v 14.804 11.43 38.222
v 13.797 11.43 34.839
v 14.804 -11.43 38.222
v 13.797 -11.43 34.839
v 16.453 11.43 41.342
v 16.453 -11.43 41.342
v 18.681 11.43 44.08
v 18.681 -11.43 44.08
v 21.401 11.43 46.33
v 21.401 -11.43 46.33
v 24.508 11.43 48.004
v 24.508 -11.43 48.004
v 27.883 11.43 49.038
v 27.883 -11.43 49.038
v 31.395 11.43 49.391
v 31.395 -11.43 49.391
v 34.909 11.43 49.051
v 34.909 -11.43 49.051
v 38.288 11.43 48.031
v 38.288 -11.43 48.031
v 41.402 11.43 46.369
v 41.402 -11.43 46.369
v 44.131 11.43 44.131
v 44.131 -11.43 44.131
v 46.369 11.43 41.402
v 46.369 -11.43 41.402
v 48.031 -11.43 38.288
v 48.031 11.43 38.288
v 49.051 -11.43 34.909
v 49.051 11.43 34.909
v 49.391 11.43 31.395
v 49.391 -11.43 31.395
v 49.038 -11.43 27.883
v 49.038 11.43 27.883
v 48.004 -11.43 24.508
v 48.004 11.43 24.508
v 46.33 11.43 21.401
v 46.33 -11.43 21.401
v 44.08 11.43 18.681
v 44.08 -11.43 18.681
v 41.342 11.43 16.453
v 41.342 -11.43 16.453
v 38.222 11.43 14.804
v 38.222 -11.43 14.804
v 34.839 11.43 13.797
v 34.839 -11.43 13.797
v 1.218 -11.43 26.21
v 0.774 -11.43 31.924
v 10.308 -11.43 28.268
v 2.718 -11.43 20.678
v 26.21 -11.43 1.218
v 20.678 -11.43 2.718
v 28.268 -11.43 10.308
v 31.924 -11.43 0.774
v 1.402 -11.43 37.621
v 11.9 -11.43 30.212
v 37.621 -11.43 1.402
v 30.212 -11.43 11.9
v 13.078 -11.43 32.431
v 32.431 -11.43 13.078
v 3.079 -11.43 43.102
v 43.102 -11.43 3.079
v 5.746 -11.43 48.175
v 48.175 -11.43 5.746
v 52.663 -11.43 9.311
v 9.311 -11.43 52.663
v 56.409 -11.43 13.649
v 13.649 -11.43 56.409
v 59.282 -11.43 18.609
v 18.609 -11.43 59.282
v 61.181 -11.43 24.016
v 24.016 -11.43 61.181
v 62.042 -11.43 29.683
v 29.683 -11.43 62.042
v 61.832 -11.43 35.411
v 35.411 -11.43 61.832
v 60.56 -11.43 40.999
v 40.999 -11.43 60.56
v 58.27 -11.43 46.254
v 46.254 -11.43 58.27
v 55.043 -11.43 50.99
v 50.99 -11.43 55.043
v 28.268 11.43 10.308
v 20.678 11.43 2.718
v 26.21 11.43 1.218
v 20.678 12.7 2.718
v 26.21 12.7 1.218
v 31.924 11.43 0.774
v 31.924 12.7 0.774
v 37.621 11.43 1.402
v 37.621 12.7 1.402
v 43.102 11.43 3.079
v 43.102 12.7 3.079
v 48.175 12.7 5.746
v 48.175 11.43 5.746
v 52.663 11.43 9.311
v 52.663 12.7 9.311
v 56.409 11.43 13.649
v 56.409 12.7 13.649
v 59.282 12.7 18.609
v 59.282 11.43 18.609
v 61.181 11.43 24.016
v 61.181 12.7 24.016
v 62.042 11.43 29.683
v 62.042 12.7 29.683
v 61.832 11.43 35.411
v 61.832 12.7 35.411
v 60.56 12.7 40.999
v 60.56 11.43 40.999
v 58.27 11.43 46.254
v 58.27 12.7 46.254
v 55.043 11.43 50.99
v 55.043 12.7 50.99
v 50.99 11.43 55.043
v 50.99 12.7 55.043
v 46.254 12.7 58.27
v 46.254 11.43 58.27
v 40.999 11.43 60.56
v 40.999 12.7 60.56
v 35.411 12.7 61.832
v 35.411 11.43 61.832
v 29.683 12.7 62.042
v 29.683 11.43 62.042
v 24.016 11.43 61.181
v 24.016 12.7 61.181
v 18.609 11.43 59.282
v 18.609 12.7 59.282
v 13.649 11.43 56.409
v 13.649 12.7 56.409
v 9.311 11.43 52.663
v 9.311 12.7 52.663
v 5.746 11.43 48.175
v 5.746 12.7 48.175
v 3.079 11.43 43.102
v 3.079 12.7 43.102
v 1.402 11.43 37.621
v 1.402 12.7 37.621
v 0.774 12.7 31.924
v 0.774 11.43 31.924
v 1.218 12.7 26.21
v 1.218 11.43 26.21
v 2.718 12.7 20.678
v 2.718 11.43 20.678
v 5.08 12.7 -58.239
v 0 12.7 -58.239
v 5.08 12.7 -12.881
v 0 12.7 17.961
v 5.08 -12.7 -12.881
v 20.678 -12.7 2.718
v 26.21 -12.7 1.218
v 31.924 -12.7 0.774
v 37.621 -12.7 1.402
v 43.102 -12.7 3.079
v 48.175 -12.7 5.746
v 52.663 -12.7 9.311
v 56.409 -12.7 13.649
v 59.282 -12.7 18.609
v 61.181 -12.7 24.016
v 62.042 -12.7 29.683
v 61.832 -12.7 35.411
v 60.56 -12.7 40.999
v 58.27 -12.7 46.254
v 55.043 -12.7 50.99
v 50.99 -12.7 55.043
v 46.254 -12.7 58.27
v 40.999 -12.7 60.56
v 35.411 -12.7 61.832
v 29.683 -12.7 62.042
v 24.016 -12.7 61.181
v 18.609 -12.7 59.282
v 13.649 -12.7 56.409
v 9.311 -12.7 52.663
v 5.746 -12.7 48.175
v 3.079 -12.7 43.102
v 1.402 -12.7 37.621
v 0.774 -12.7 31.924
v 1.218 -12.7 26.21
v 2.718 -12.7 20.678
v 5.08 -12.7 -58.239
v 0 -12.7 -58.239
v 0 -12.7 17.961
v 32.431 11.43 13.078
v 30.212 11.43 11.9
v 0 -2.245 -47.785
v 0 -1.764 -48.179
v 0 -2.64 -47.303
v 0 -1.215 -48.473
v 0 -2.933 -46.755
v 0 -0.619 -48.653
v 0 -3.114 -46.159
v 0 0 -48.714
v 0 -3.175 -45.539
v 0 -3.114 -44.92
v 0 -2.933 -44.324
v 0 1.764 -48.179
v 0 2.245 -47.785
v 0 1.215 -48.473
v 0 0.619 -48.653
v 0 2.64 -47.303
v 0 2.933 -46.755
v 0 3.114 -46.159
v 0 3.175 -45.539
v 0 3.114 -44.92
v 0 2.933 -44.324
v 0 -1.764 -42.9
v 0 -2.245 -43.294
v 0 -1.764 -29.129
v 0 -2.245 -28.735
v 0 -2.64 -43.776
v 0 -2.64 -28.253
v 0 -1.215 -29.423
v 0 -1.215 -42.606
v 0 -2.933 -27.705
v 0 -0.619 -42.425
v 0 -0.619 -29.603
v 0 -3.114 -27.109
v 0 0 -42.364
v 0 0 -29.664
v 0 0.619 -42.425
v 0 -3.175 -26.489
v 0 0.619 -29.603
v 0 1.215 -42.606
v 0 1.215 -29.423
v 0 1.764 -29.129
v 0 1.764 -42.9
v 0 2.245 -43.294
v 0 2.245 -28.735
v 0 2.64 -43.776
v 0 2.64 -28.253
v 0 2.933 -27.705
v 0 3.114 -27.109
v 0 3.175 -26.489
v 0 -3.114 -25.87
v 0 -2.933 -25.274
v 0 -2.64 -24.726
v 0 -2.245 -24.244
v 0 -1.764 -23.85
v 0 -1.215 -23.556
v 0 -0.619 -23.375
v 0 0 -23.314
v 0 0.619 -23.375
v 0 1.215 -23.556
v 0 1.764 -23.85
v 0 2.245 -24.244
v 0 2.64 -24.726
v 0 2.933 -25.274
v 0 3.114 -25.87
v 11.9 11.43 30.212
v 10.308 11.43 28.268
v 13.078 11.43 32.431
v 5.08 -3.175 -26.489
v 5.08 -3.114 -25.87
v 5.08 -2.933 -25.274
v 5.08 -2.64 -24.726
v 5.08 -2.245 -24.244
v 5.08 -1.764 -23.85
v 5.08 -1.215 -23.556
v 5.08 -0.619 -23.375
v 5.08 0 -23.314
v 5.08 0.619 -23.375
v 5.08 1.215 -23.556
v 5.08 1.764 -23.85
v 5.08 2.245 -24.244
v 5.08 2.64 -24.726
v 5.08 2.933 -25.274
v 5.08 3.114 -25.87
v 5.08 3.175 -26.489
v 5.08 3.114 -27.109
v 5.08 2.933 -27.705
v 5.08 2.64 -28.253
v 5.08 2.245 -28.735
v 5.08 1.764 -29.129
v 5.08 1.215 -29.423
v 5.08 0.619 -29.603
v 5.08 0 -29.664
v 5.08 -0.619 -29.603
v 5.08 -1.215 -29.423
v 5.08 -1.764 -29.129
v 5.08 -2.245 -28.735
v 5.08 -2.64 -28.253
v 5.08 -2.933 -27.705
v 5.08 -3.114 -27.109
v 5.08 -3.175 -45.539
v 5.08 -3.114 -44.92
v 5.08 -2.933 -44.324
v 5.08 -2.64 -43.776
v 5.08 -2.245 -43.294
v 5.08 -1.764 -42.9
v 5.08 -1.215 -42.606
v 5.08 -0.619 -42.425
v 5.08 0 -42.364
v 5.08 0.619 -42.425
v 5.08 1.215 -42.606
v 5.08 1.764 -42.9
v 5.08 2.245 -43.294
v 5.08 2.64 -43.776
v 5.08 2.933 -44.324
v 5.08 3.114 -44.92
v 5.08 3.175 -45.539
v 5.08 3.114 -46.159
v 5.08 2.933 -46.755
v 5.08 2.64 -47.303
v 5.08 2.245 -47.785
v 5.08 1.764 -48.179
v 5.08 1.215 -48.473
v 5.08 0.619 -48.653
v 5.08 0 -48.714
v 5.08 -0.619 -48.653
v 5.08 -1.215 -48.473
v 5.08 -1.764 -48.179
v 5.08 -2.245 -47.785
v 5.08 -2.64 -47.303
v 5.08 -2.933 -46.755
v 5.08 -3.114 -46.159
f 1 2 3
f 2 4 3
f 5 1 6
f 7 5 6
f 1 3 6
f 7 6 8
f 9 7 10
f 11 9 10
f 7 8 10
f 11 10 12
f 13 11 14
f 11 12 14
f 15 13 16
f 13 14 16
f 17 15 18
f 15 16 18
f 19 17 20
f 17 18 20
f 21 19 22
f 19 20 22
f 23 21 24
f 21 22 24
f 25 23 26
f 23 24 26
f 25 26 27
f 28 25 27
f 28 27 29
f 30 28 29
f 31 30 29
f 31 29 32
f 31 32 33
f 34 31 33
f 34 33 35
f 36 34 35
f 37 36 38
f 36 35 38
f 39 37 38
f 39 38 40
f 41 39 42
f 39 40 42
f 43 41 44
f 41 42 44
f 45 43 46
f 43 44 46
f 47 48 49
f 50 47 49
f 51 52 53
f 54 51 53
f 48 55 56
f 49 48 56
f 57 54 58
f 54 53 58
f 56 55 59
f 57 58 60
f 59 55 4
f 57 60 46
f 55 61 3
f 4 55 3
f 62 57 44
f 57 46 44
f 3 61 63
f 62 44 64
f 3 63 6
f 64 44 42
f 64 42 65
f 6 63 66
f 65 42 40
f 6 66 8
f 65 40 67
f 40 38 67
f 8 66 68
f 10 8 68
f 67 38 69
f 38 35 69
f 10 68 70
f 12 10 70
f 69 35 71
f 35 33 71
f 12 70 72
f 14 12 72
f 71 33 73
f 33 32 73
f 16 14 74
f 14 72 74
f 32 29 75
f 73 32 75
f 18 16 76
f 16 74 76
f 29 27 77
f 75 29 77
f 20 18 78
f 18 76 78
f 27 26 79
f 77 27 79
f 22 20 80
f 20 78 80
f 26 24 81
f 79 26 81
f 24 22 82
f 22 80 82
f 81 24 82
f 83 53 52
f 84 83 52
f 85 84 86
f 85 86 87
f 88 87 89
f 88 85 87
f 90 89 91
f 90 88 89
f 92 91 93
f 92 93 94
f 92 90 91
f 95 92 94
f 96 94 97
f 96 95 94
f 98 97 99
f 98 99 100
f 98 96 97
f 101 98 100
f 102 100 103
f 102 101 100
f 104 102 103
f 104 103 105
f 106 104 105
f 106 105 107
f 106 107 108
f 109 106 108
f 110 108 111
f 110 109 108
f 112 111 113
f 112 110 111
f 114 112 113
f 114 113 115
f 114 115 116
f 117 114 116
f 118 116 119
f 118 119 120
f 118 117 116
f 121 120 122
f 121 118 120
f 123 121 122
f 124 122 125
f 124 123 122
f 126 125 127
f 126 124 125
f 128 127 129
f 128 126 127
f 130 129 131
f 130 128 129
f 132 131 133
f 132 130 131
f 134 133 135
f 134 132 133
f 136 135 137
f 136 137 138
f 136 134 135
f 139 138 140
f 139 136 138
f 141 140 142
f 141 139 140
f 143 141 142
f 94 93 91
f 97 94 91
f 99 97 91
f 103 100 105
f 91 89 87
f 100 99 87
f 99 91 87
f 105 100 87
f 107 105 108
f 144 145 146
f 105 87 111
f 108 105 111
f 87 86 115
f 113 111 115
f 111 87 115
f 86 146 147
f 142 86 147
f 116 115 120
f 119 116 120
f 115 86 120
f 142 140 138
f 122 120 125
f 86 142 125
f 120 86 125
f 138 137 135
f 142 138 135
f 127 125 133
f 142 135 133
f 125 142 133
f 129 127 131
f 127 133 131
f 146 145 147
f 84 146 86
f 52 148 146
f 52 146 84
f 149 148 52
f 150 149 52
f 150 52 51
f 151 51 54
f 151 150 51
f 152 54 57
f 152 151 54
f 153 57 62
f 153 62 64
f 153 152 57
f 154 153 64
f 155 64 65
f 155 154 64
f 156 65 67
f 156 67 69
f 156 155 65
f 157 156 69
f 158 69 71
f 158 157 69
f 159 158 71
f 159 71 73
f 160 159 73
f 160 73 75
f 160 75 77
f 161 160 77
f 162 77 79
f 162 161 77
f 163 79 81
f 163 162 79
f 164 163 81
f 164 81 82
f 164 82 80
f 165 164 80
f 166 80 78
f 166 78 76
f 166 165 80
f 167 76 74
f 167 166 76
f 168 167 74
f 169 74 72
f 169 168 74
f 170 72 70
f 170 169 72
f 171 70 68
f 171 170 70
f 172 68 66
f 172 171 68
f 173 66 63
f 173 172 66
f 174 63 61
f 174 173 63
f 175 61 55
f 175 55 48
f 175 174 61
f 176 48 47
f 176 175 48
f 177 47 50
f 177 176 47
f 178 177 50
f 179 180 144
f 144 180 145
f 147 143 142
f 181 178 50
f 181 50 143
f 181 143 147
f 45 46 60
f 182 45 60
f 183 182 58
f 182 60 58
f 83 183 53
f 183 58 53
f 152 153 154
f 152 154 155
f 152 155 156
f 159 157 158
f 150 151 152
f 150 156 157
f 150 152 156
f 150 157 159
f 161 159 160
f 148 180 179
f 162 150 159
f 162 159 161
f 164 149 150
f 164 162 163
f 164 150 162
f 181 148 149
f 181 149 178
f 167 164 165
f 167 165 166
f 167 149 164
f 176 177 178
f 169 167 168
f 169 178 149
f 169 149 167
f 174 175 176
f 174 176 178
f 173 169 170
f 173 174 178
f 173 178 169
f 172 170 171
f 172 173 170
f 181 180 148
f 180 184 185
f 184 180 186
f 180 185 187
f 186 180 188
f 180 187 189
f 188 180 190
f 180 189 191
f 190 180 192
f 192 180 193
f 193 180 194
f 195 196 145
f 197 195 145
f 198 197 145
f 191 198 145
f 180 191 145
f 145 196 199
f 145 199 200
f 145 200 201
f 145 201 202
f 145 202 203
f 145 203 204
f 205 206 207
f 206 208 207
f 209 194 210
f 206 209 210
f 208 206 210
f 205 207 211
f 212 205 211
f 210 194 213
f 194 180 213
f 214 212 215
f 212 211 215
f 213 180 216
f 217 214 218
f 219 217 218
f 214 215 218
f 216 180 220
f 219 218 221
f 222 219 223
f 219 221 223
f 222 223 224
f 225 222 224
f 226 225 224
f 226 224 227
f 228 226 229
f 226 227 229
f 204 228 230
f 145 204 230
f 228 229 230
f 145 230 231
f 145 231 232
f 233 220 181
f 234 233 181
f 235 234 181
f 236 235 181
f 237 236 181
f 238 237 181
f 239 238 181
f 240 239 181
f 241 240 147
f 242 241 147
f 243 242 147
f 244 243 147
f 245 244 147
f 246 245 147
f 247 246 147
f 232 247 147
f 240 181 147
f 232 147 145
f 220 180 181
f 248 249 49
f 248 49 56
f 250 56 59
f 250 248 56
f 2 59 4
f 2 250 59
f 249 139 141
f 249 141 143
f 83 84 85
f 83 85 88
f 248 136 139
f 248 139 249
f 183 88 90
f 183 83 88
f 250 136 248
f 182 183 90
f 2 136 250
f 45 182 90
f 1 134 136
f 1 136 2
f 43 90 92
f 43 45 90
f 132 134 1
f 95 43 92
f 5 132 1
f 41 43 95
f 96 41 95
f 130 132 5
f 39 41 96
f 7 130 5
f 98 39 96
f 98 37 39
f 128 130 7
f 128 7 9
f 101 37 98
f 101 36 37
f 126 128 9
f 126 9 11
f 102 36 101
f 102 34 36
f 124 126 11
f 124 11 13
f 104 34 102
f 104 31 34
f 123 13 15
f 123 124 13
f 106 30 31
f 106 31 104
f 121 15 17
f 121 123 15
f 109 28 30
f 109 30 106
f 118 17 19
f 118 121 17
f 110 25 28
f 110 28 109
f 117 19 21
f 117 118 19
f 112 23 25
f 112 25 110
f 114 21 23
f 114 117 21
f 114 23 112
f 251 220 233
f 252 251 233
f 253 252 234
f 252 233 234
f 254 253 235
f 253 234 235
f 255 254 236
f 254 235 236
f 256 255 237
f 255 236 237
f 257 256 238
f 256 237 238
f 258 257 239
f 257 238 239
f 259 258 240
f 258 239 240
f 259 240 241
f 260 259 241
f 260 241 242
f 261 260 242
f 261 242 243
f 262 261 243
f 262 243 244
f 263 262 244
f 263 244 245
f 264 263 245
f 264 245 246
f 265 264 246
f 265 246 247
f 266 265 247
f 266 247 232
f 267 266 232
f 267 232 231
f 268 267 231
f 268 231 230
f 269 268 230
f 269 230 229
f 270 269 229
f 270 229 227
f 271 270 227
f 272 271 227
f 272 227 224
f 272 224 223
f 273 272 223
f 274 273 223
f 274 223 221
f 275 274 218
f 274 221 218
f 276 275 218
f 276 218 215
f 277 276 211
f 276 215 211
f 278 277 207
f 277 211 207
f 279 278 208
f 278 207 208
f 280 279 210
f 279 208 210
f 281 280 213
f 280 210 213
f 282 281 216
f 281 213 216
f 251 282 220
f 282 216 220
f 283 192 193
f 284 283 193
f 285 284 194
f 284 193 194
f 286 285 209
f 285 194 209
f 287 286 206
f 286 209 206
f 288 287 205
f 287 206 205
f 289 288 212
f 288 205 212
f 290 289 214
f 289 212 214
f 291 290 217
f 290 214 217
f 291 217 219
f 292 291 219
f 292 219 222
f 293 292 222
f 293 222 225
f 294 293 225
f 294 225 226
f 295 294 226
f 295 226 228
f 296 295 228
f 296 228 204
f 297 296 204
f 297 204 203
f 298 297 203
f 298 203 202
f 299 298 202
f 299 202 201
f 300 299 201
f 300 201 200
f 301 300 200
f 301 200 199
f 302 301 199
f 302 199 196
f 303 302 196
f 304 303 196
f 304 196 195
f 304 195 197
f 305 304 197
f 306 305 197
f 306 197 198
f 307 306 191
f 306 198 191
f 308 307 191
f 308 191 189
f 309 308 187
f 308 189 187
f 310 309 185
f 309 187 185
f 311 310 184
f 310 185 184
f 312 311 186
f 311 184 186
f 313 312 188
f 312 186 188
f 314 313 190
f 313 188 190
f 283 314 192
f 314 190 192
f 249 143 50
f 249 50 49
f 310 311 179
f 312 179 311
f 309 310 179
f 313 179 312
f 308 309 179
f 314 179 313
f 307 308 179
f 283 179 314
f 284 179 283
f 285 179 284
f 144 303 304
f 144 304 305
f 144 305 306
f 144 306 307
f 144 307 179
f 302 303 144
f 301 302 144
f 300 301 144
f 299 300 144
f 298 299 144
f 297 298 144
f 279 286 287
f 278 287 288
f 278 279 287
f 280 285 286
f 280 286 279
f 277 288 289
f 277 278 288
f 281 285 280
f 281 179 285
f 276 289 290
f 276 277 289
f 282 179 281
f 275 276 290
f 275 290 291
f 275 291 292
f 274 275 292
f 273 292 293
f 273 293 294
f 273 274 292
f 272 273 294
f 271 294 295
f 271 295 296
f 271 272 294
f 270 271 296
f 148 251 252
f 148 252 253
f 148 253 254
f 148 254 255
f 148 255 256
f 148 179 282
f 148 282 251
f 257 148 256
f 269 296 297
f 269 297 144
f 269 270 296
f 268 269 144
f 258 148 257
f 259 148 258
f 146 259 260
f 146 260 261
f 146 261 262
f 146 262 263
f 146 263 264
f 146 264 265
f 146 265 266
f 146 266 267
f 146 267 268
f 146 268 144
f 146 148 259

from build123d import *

# Parameters (mm, degrees)
F1_DEPTH      = 12.7
F1_DEPTH_BACK = 12.7
F2_DEPTH      = 11.43
F2_DEPTH_BACK = 11.43
F3_W          = 25.4
F3_H          = 76.2
F4_DEPTH      = 5.08
F6_D          = 6.35


with BuildPart() as f1:
    # F0 (on Front) → F1 (new body, two sides)
    with BuildSketch(Plane.XZ) as f1_sk:
        with BuildLine():
            Line((0, 17.9605122421), (0, -17.9605122421))
            Line((0, -17.9605122421), (20.6782230746, 2.7177108325))
            Line((20.6782230746, 2.7177108325), (28.2681090435, 10.3075968013))
            ThreePointArc((28.2681090435, 10.3075968013), (31.2921928816, 12.5440252054), (34.8386907134, 13.7966417449))
            ThreePointArc((34.8386907134, 13.7966417449), (44.1308964237, 44.1308964237), (13.7966417449, 34.8386907134))
            ThreePointArc((13.7966417449, 34.8386907134), (12.5440252054, 31.2921928816), (10.3075968013, 28.2681090435))
            Line((10.3075968013, 28.2681090435), (2.7177108325, 20.6782230746))
            Line((2.7177108325, 20.6782230746), (0, 17.9605122421))
        make_face()
        with BuildLine():
            Line((28.2681090435, 10.3075968013), (20.6782230746, 2.7177108325))
            ThreePointArc((20.6782230746, 2.7177108325), (53.1111525448, 53.1111525448), (2.7177108325, 20.6782230746))
            Line((2.7177108325, 20.6782230746), (10.3075968013, 28.2681090435))
            ThreePointArc((10.3075968013, 28.2681090435), (12.5440252054, 31.2921928816), (13.7966417449, 34.8386907134))
            ThreePointArc((13.7966417449, 34.8386907134), (44.1308964237, 44.1308964237), (34.8386907134, 13.7966417449))
            ThreePointArc((34.8386907134, 13.7966417449), (31.2921928816, 12.5440252054), (28.2681090435, 10.3075968013))
        make_face()
    extrude(amount=F1_DEPTH)
    extrude(f1_sk.sketch, amount=-F1_DEPTH_BACK)

    # F0 (on Front) → F2 (cut, two sides)
    with BuildSketch(Plane.XZ) as f2_sk:
        with BuildLine():
            Line((28.2681090435, 10.3075968013), (20.6782230746, 2.7177108325))
            ThreePointArc((20.6782230746, 2.7177108325), (53.1111525448, 53.1111525448), (2.7177108325, 20.6782230746))
            Line((2.7177108325, 20.6782230746), (10.3075968013, 28.2681090435))
            ThreePointArc((10.3075968013, 28.2681090435), (12.5440252054, 31.2921928816), (13.7966417449, 34.8386907134))
            ThreePointArc((13.7966417449, 34.8386907134), (44.1308964237, 44.1308964237), (34.8386907134, 13.7966417449))
            ThreePointArc((34.8386907134, 13.7966417449), (31.2921928816, 12.5440252054), (28.2681090435, 10.3075968013))
        make_face()
    extrude(amount=-F2_DEPTH, mode=Mode.SUBTRACT)
    extrude(f2_sk.sketch, amount=F2_DEPTH_BACK, mode=Mode.SUBTRACT)

    # F3 (on Right) → F4 (join)
    with BuildSketch(Plane.YZ):
        with Locations((0, -20.1394877579)):
            Rectangle(F3_W, F3_H)
    extrude(amount=F4_DEPTH)

    # F6 (through all)
    with Locations(Plane.YZ.offset(5.08)):
        with Locations((0, -26.4894877579), (0, -45.5394877579)):
            Hole(F6_D / 2)


solid = f1.part
